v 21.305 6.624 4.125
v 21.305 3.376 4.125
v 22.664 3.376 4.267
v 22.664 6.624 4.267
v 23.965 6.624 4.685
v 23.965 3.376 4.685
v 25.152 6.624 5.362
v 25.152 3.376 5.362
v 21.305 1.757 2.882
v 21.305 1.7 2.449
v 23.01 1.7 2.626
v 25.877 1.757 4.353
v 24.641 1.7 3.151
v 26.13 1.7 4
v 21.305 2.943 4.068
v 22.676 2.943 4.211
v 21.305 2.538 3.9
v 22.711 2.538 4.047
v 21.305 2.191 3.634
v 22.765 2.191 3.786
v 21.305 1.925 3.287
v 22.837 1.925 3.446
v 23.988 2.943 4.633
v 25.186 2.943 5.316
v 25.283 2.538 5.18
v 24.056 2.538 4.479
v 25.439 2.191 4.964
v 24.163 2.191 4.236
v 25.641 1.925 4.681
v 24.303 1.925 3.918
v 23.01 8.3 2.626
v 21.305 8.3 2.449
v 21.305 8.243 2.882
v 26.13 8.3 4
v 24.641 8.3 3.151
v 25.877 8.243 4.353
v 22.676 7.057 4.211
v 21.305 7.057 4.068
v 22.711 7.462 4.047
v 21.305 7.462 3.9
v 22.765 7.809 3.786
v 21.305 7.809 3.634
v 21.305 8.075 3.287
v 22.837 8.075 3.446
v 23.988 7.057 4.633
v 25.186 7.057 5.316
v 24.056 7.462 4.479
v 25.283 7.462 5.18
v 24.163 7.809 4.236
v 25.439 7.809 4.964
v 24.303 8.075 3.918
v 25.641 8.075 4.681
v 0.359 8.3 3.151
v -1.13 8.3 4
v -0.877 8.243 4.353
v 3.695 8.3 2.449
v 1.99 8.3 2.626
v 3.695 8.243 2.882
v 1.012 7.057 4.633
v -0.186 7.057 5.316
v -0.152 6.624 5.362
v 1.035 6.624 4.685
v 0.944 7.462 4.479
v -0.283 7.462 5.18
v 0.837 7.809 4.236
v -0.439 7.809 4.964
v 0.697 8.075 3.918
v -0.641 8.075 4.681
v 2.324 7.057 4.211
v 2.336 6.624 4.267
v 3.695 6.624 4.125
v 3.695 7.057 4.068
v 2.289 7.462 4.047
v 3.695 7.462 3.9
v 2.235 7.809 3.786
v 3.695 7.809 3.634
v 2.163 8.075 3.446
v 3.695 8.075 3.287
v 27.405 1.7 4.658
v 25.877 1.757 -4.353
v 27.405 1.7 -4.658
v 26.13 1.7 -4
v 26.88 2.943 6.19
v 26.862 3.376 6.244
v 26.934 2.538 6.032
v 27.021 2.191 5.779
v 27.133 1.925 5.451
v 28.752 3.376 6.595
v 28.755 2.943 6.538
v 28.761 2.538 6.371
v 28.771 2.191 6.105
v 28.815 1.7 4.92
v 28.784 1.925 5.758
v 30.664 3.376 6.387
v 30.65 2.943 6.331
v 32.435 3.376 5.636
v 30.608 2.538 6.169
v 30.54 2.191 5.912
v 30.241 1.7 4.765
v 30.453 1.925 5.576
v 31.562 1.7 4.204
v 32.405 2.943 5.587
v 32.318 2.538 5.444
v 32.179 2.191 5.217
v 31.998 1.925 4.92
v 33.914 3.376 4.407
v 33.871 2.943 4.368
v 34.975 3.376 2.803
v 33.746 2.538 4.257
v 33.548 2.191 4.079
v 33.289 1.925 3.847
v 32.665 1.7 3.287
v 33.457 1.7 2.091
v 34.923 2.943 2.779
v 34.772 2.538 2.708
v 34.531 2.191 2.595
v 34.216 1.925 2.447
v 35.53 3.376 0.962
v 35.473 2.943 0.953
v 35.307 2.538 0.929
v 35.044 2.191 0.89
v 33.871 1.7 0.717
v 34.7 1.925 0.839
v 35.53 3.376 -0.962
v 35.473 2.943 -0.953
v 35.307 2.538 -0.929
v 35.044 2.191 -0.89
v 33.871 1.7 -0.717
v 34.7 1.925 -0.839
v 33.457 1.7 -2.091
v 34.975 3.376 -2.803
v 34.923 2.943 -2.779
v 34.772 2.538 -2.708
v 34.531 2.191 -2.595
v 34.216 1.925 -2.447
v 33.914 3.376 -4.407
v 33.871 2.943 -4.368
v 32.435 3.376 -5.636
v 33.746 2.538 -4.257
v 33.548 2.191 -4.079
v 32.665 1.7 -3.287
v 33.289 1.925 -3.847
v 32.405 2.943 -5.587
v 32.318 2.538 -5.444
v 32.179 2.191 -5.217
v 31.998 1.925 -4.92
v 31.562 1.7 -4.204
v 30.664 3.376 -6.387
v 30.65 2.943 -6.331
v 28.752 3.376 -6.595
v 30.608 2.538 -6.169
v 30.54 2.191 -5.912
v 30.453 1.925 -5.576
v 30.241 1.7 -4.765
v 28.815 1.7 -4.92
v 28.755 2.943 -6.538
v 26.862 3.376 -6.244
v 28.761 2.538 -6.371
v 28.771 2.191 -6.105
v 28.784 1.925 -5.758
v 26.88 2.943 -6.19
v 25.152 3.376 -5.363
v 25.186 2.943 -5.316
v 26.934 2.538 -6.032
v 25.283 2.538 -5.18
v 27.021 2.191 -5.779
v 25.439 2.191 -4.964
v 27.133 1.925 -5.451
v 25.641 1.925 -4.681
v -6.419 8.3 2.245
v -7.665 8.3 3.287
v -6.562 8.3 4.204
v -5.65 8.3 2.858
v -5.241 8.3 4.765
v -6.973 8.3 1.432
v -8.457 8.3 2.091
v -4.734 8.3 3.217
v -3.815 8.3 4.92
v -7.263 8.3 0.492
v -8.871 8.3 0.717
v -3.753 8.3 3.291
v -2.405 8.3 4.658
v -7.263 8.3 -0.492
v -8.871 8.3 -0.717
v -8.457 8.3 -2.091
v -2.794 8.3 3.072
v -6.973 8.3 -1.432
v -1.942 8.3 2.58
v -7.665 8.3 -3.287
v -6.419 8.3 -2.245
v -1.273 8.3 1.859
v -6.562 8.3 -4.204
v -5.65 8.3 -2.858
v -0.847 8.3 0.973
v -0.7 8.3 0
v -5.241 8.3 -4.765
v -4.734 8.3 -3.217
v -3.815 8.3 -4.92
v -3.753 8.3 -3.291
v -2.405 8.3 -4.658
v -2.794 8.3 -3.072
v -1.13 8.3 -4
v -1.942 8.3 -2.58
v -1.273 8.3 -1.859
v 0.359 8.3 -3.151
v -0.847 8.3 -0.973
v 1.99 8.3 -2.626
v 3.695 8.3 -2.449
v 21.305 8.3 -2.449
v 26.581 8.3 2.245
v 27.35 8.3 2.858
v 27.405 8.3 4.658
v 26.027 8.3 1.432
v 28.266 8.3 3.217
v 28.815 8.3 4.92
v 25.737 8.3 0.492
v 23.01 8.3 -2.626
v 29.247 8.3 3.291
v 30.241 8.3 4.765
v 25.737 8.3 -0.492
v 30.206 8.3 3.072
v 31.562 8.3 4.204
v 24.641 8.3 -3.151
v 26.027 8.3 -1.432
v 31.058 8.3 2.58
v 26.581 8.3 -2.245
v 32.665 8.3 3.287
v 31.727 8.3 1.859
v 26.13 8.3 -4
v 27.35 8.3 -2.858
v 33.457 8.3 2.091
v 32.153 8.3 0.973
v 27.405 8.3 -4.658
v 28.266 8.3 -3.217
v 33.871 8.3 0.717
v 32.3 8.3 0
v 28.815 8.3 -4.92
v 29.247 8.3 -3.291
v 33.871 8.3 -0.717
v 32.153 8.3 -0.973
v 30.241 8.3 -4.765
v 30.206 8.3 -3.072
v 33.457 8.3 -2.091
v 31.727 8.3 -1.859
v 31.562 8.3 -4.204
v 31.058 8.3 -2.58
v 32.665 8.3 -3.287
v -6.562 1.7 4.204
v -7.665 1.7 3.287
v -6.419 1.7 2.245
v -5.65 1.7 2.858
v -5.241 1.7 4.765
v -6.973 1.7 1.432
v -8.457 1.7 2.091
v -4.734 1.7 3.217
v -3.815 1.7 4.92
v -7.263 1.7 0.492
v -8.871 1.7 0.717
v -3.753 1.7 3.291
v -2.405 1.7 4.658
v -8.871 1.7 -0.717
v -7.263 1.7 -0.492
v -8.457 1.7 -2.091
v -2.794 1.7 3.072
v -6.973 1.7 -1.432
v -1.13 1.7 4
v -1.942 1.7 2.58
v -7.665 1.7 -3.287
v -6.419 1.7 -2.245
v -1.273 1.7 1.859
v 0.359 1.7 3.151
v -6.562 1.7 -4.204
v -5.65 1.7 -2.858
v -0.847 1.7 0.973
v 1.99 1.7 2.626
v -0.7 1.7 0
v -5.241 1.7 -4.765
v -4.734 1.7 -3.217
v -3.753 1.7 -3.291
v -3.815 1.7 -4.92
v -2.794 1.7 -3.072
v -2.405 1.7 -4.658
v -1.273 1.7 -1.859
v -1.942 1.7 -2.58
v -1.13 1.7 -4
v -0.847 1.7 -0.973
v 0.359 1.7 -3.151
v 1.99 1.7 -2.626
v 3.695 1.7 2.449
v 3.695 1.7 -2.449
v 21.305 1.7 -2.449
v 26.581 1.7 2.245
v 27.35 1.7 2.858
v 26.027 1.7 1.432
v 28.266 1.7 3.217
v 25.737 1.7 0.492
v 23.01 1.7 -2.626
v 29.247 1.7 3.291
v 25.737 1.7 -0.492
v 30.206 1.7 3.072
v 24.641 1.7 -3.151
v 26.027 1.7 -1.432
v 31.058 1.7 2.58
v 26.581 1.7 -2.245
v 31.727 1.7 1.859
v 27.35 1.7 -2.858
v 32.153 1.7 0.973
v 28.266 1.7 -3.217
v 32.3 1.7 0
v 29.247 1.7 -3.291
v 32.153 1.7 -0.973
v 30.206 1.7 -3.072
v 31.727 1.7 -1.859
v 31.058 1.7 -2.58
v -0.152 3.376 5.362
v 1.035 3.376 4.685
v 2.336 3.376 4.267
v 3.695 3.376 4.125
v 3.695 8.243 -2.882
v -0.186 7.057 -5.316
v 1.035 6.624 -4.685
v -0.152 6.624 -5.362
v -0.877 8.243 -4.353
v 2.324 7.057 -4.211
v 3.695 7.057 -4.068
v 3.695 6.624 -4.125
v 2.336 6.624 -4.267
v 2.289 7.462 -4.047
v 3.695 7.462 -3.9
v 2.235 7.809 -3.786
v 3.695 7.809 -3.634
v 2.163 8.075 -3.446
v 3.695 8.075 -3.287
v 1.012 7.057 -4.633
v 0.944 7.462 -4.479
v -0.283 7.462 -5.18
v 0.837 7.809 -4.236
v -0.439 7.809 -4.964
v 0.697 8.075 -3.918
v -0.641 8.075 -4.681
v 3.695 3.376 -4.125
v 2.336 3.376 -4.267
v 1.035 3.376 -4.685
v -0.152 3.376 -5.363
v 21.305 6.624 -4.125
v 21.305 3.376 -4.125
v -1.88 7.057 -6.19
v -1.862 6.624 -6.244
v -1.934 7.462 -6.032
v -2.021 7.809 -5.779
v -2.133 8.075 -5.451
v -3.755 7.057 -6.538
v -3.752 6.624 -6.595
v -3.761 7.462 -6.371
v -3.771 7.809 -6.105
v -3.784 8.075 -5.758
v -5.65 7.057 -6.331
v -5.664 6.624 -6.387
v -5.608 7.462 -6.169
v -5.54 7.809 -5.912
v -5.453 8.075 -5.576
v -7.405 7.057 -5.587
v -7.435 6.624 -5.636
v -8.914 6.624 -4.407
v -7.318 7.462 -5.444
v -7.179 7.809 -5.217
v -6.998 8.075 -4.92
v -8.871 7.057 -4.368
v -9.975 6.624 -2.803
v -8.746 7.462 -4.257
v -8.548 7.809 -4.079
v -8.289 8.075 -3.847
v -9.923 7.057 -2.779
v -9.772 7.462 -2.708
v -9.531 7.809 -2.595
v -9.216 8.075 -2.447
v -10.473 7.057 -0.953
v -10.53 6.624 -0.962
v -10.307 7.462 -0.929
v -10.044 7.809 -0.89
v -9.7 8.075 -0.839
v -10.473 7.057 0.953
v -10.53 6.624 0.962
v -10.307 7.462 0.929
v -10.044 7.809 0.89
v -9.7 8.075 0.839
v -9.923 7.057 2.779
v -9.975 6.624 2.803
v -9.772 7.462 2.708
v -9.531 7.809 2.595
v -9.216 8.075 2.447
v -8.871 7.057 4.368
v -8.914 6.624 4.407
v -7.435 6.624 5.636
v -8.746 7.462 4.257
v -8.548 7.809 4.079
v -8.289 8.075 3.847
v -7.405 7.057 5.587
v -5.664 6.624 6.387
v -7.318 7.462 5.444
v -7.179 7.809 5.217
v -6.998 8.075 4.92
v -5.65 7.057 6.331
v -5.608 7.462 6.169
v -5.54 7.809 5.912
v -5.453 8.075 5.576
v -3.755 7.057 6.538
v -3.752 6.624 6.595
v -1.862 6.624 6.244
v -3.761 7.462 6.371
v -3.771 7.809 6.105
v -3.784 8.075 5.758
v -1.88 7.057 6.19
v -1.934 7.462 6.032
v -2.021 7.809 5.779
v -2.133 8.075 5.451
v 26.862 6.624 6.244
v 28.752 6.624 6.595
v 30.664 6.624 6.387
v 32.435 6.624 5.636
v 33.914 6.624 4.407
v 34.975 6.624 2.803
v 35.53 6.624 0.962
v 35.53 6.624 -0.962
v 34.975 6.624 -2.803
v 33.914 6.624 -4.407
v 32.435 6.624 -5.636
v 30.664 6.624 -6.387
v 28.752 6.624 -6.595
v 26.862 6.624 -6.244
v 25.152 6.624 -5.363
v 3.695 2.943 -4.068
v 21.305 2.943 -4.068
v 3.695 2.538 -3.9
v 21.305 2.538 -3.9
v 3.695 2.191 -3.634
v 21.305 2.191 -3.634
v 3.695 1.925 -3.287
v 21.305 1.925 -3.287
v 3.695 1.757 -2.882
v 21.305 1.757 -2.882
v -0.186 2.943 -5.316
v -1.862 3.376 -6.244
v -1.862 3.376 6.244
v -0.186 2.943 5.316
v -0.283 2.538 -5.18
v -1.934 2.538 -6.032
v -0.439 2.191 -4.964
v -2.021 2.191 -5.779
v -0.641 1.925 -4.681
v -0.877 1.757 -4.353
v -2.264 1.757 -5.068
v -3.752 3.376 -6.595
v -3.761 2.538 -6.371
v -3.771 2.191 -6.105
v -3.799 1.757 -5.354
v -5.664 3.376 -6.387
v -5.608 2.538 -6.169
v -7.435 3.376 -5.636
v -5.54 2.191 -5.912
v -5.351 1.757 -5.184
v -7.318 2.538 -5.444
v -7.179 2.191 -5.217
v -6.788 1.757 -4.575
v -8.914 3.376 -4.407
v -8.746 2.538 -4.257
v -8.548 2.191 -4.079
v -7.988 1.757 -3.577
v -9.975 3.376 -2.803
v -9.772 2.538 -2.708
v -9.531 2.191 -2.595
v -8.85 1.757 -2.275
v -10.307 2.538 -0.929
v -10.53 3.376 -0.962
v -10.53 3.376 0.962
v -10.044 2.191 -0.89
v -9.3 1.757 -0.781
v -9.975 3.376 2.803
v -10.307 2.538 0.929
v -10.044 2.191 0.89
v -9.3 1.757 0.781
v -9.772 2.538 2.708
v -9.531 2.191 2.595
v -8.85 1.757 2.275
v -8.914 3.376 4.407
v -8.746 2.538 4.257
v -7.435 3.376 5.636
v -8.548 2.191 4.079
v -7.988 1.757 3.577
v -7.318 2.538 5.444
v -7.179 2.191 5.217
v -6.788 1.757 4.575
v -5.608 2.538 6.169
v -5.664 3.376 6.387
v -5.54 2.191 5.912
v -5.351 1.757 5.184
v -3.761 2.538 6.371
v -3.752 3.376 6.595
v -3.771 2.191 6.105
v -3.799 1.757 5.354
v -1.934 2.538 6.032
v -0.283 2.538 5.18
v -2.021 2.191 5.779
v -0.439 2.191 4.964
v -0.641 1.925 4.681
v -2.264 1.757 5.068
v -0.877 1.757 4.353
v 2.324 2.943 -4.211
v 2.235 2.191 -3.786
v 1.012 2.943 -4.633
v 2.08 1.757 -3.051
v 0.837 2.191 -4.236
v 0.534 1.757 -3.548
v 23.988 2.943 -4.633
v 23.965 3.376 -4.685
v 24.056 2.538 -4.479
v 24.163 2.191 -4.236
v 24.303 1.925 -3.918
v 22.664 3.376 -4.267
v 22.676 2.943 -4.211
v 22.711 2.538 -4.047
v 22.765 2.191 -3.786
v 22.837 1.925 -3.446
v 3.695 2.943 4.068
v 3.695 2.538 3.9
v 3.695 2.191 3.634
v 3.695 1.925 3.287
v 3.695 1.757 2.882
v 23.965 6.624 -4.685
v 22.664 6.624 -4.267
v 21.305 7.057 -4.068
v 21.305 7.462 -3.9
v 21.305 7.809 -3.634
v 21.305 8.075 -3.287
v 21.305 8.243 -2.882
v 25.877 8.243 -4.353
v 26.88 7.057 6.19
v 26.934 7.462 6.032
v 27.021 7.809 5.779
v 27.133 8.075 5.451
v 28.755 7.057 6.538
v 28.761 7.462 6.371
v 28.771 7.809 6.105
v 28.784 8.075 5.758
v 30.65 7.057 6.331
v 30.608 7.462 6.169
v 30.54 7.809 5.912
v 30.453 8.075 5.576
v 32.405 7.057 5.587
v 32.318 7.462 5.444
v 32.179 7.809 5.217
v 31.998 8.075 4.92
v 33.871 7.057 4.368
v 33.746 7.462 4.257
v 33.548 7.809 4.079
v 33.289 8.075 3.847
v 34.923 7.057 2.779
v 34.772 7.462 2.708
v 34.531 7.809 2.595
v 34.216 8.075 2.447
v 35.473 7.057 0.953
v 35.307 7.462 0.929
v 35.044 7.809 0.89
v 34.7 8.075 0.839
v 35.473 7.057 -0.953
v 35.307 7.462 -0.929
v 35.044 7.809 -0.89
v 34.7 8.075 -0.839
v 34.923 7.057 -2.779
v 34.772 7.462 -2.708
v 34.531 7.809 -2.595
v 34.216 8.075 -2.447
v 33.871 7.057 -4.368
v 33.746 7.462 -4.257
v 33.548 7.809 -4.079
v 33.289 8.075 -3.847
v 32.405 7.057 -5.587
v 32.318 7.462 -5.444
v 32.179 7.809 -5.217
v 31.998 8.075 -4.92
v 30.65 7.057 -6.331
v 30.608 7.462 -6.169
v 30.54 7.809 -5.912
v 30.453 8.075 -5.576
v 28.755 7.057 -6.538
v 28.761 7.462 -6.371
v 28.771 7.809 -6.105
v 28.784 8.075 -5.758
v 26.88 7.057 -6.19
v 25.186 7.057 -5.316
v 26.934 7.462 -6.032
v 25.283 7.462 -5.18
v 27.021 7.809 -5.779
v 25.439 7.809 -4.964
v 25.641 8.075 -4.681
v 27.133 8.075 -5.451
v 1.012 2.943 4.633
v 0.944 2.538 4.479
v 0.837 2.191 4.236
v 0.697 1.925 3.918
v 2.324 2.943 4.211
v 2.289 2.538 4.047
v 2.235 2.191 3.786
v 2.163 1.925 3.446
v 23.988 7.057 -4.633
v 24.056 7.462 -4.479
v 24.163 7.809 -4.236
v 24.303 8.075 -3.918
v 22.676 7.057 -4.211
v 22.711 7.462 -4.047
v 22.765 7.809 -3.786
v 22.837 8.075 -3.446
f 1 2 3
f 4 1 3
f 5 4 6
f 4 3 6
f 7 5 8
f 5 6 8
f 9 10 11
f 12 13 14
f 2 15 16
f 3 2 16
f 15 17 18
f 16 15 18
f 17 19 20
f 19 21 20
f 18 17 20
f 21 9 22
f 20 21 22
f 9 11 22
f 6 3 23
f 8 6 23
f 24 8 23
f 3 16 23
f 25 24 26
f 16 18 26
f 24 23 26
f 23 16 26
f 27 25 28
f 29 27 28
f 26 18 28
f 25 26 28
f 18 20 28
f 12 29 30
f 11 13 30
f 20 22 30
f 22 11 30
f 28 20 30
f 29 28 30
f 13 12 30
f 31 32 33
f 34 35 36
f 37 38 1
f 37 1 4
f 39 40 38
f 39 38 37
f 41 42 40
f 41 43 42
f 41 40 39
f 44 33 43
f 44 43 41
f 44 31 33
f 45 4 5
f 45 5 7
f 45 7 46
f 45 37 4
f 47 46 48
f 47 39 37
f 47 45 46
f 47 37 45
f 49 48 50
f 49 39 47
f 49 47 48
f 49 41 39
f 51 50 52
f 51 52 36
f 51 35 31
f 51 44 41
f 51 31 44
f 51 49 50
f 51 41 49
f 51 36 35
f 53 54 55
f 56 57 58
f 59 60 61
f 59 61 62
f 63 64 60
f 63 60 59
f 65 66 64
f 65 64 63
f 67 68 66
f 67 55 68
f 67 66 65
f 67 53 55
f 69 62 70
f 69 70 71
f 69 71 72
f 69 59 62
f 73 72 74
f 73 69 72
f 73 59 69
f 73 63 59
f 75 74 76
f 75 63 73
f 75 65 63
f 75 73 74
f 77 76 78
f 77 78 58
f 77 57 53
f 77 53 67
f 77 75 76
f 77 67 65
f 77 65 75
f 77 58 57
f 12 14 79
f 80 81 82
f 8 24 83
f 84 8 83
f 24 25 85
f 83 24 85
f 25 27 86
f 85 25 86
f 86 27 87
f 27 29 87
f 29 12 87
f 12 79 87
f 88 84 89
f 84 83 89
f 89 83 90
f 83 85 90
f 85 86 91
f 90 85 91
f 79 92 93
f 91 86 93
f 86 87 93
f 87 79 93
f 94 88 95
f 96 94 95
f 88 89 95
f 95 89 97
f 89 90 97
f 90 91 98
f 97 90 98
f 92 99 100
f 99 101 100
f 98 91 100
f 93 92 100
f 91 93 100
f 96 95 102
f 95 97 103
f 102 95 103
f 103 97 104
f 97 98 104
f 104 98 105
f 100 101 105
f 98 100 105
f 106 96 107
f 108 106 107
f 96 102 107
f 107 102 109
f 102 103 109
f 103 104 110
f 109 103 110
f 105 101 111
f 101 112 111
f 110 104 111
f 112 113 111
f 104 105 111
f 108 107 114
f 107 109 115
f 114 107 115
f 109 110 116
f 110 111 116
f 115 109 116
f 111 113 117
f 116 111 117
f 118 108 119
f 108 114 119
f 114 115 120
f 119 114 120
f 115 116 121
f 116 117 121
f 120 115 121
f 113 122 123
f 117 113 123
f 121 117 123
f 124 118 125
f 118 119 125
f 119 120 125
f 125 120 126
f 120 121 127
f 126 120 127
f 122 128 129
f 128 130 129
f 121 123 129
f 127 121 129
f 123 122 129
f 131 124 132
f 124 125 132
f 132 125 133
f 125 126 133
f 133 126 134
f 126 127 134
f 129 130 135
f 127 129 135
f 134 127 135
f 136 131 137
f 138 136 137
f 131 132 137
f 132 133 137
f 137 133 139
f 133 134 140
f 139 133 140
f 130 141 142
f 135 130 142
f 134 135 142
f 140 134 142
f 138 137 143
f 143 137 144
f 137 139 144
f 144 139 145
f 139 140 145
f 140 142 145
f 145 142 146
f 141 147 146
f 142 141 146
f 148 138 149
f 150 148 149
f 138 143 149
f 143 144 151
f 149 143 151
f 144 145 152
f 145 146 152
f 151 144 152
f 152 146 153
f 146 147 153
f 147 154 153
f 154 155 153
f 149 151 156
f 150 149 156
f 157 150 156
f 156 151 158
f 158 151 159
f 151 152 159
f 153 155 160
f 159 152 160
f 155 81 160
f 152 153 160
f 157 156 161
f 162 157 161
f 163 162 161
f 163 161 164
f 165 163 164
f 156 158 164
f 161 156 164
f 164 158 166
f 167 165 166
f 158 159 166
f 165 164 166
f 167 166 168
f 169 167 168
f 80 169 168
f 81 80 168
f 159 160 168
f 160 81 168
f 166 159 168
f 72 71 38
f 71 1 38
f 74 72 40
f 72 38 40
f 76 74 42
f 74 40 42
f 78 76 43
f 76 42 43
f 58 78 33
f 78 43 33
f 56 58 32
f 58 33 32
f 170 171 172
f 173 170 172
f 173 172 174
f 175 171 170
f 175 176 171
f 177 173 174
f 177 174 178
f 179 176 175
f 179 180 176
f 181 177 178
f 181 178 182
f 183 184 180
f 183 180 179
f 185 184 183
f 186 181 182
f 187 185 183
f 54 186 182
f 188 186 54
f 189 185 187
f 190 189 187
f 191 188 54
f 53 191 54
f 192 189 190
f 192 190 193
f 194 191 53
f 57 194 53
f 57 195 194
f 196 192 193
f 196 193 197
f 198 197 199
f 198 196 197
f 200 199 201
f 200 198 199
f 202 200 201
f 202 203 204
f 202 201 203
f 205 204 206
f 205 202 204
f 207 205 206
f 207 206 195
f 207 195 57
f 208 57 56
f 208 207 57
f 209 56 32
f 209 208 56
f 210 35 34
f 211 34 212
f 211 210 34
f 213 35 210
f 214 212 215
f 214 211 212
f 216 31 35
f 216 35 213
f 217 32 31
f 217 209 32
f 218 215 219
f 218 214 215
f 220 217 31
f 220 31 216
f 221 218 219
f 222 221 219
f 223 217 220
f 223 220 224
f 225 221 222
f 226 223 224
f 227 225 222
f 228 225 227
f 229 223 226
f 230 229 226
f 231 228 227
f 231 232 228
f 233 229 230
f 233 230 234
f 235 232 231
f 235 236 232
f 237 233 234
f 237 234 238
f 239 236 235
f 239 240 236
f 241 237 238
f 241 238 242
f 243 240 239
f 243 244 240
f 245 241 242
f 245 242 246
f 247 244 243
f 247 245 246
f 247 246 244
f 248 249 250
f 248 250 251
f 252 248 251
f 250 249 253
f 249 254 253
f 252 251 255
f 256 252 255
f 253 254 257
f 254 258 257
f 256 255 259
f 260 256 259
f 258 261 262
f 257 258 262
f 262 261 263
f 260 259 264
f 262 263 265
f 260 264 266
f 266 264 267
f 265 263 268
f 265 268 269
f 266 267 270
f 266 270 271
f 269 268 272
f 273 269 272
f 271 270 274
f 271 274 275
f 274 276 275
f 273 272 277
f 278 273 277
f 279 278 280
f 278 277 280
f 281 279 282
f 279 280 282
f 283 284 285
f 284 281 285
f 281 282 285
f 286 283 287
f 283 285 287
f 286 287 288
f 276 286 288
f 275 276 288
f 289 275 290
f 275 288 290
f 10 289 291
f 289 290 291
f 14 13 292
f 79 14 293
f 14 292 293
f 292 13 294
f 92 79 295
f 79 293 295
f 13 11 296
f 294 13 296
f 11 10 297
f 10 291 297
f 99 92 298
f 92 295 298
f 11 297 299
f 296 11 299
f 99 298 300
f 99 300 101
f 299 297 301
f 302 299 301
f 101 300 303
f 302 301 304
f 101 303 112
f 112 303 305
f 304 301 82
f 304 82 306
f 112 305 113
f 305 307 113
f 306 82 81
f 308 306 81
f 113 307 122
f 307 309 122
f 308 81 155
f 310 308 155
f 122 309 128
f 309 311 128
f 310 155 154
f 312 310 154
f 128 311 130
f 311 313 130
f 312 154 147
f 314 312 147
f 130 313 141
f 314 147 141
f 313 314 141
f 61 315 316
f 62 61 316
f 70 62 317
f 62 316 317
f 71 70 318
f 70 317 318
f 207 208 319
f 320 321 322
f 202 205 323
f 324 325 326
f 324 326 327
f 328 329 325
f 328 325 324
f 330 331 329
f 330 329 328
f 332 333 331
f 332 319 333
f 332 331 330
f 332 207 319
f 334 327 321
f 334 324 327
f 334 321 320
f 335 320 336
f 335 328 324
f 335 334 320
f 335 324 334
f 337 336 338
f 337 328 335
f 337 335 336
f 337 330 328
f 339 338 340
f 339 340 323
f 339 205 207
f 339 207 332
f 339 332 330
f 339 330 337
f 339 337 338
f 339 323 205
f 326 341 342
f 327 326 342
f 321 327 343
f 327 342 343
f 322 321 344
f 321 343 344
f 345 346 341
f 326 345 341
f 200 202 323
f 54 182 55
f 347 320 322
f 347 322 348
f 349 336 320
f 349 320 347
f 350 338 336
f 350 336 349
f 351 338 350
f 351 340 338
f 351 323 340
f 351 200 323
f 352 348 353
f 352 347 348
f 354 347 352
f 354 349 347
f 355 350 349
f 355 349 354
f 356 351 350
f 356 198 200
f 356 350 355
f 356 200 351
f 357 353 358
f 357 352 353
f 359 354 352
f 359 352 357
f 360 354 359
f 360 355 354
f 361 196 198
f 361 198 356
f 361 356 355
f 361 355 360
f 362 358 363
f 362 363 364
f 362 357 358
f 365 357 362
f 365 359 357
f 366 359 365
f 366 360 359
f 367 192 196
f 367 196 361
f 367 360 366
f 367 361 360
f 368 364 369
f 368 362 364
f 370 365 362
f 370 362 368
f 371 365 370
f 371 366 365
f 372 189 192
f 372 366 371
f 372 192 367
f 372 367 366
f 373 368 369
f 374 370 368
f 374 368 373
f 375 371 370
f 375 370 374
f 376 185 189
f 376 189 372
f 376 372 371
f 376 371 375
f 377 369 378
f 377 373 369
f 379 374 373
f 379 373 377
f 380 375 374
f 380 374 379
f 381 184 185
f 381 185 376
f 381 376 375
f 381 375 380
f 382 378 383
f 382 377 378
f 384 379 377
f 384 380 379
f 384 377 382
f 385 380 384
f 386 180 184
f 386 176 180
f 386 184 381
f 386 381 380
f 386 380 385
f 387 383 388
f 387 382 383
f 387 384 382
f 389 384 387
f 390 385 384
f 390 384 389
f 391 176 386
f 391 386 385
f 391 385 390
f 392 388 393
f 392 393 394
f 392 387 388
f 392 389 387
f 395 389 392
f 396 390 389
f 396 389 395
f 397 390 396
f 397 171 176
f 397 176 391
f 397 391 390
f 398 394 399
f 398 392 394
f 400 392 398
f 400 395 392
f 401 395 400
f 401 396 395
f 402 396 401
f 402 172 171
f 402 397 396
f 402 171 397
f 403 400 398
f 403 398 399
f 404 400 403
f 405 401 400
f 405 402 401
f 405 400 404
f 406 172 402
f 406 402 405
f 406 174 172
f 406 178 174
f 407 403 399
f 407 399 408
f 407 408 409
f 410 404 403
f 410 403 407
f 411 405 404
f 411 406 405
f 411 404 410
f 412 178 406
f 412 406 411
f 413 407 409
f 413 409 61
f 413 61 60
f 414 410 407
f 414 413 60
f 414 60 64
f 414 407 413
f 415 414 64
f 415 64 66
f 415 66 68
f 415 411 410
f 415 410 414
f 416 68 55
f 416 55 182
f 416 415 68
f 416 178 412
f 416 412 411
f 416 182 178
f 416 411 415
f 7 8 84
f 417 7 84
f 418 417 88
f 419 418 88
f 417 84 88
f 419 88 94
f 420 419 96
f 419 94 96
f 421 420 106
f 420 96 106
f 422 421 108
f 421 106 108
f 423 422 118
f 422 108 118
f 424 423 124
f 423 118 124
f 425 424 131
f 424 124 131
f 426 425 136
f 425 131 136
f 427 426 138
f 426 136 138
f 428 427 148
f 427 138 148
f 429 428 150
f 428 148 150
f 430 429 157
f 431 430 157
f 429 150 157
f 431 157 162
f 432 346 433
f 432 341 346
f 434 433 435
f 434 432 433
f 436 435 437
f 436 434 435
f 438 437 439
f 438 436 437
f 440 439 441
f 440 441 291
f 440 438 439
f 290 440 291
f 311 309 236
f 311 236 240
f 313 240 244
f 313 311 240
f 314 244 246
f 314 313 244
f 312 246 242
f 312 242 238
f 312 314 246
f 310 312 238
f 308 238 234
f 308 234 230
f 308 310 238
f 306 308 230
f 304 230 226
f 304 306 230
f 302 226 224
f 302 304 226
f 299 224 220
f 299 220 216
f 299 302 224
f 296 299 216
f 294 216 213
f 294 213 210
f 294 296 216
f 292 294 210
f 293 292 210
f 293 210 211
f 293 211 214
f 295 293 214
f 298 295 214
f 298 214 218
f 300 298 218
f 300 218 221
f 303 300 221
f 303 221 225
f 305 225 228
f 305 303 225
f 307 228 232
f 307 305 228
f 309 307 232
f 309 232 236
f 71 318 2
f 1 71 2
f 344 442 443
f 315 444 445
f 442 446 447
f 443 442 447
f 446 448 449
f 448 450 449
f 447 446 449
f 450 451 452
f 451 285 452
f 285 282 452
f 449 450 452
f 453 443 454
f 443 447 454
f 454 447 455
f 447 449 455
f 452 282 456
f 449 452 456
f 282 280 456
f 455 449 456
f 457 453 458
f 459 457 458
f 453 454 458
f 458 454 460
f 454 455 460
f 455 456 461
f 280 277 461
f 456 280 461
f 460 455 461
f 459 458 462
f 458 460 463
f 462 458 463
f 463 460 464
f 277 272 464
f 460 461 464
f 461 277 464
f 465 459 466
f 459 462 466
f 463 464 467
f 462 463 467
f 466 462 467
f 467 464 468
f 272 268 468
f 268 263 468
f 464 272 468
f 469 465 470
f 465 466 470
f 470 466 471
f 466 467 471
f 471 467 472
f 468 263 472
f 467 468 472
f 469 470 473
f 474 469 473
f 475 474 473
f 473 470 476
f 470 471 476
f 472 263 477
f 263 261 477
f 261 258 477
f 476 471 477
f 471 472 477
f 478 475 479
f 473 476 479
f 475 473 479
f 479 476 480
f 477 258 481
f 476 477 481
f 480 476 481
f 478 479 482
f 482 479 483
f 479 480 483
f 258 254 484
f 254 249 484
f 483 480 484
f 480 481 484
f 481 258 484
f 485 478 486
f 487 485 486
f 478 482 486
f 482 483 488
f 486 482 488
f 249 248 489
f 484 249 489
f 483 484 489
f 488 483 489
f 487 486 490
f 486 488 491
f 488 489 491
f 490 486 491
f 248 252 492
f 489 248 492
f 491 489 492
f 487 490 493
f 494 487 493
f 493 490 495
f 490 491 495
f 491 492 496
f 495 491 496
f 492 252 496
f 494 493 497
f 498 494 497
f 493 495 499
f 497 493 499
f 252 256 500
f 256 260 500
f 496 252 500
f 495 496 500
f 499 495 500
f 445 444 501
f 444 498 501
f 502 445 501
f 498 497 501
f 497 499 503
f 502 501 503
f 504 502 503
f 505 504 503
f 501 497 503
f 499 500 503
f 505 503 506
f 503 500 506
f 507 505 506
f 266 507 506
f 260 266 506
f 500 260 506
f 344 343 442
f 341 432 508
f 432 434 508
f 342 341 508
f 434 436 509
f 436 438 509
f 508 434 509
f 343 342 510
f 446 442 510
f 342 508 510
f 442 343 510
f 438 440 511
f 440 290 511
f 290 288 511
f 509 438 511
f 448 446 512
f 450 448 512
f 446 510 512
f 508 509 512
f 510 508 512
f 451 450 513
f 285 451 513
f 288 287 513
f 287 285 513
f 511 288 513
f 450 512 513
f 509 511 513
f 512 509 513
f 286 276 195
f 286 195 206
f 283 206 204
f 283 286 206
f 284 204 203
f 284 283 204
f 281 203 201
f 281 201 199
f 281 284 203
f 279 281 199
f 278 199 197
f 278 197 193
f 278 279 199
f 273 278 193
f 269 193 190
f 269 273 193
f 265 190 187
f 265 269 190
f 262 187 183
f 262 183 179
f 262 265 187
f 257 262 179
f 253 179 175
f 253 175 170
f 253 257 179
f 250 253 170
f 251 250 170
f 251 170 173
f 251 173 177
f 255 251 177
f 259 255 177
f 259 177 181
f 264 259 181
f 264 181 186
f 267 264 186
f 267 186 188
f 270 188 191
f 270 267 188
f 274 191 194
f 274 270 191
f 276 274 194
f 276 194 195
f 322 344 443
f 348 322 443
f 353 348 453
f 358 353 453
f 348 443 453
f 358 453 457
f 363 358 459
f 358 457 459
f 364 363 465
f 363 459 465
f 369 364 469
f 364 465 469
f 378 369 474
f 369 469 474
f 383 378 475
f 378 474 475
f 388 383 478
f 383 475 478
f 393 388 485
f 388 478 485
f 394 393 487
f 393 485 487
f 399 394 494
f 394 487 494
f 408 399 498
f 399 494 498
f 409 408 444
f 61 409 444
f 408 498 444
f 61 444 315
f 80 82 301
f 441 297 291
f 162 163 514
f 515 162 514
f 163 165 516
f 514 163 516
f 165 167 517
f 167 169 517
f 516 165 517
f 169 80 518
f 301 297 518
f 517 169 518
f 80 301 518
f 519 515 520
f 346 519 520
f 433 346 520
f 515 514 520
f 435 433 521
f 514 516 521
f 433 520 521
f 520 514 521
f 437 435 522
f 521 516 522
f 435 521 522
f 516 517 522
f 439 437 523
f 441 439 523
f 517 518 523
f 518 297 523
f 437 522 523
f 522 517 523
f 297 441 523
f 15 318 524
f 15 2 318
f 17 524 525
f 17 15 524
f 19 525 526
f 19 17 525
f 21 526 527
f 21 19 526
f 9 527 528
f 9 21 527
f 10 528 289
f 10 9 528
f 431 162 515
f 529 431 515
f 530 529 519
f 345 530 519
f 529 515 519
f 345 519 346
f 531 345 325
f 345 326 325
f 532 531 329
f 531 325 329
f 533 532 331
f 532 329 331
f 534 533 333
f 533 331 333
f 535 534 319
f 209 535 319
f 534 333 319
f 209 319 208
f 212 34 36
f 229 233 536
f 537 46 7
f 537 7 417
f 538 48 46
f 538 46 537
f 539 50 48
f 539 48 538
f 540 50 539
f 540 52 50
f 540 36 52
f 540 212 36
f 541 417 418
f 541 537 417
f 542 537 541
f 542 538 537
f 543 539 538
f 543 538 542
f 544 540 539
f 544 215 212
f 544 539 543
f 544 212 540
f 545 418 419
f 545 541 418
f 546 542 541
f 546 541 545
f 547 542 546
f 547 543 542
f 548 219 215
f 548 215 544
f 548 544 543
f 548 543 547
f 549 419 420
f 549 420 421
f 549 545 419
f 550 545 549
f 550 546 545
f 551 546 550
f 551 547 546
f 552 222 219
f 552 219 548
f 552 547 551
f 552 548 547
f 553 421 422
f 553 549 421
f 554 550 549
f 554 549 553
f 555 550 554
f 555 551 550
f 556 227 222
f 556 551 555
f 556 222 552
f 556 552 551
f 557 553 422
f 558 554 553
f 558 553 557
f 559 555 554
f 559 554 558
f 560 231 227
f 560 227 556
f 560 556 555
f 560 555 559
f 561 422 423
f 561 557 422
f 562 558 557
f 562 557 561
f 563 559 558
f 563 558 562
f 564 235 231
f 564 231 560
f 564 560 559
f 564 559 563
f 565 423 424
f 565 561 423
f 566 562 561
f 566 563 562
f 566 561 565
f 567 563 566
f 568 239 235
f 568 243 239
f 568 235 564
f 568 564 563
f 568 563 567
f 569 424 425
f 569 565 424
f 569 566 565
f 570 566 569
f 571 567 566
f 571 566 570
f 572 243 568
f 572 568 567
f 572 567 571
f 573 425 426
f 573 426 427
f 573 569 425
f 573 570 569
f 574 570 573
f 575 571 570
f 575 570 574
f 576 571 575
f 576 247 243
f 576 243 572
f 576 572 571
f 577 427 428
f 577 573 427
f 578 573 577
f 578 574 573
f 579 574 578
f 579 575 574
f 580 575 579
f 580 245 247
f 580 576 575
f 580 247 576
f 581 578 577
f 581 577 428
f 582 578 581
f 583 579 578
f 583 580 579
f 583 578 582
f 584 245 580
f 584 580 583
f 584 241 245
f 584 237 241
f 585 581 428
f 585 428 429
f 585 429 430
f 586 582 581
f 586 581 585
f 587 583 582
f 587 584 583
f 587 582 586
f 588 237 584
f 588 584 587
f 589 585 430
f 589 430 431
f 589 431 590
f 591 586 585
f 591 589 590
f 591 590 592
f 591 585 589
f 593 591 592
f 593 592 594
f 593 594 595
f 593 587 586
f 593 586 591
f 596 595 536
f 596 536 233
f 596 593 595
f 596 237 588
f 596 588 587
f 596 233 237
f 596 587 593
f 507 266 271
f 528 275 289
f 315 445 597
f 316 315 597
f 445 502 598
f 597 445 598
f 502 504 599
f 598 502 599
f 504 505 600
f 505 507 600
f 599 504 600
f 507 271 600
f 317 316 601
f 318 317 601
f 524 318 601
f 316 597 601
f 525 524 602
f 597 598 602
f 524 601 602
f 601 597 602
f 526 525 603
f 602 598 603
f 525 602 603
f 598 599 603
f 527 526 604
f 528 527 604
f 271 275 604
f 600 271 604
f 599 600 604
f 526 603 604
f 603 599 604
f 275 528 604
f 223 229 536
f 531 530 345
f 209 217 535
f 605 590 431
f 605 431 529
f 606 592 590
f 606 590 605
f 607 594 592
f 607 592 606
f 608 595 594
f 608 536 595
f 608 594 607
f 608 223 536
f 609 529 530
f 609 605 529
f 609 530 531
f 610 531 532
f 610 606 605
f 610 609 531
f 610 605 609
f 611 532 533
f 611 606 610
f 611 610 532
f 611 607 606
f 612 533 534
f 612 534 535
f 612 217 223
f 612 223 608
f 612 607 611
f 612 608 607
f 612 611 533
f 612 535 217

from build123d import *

# Parameters (mm, degrees)
SKETCH1_R           = 5
BOSS_EXTRUDE1_DEPTH = 10
FILLET1_R           = 2.54
SCALE1_SCALE        = 0.66


with BuildPart() as part:
    # Sketch1 → Boss-Extrude1 (new body)
    with BuildSketch(Plane(origin=(0, 0, 0), x_dir=(1, 0, 0), z_dir=(0, 1, 0))):
        with BuildLine():
            Line((-0.840776184, -6.25), (25.840776184, -6.25))
            ThreePointArc((25.840776184, -6.25), (28.902638362, -6.730283618), (31.670388092, -8.125))
            ThreePointArc((31.670388092, -8.125), (47.5, 0), (31.670388092, 8.125))
            ThreePointArc((31.670388092, 8.125), (28.902638362, 6.730283618), (25.840776184, 6.25))
            Line((25.840776184, 6.25), (-0.840776184, 6.25))
            ThreePointArc((-0.840776184, 6.25), (-3.902638362, 6.730283618), (-6.670388092, 8.125))
            ThreePointArc((-6.670388092, 8.125), (-22.5, 0), (-6.670388092, -8.125))
            ThreePointArc((-6.670388092, -8.125), (-3.902638362, -6.730283618), (-0.840776184, -6.25))
        make_face()
        with Locations((-12.5, 0)):
            Circle(SKETCH1_R, mode=Mode.SUBTRACT)
        with Locations((37.5, 0)):
            Circle(SKETCH1_R, mode=Mode.SUBTRACT)
    extrude(amount=BOSS_EXTRUDE1_DEPTH)

    # Fillet1
    fillet1_edges = [part.edges().sort_by_distance(p)[0] for p in [
        (-3.902638362, 10, 6.730283618),
        (-22.5, 0, 0),
        (-3.902638362, 0, -6.730283618),
        (12.5, 10, 6.25),
        (28.902638362, 10, 6.730283618),
        (47.5, 10, 0),
        (28.902638362, 10, -6.730283618),
        (12.5, 10, -6.25),
        (-3.902638362, 10, -6.730283618),
        (-22.5, 10, 0),
        (12.5, 0, -6.25),
        (28.902638362, 0, -6.730283618),
        (47.5, 0, 0),
        (28.902638362, 0, 6.730283618),
        (12.5, 0, 6.25),
        (-3.902638362, 0, 6.730283618),
    ]]
    fillet(fillet1_edges, radius=FILLET1_R)


with BuildPart() as part_1:
    # Scale1: scaled about (12.5, 5, 0)
    add(part.part.scale(SCALE1_SCALE).moved(Location((4.25, 1.7, 0))))


solid = part_1.part
